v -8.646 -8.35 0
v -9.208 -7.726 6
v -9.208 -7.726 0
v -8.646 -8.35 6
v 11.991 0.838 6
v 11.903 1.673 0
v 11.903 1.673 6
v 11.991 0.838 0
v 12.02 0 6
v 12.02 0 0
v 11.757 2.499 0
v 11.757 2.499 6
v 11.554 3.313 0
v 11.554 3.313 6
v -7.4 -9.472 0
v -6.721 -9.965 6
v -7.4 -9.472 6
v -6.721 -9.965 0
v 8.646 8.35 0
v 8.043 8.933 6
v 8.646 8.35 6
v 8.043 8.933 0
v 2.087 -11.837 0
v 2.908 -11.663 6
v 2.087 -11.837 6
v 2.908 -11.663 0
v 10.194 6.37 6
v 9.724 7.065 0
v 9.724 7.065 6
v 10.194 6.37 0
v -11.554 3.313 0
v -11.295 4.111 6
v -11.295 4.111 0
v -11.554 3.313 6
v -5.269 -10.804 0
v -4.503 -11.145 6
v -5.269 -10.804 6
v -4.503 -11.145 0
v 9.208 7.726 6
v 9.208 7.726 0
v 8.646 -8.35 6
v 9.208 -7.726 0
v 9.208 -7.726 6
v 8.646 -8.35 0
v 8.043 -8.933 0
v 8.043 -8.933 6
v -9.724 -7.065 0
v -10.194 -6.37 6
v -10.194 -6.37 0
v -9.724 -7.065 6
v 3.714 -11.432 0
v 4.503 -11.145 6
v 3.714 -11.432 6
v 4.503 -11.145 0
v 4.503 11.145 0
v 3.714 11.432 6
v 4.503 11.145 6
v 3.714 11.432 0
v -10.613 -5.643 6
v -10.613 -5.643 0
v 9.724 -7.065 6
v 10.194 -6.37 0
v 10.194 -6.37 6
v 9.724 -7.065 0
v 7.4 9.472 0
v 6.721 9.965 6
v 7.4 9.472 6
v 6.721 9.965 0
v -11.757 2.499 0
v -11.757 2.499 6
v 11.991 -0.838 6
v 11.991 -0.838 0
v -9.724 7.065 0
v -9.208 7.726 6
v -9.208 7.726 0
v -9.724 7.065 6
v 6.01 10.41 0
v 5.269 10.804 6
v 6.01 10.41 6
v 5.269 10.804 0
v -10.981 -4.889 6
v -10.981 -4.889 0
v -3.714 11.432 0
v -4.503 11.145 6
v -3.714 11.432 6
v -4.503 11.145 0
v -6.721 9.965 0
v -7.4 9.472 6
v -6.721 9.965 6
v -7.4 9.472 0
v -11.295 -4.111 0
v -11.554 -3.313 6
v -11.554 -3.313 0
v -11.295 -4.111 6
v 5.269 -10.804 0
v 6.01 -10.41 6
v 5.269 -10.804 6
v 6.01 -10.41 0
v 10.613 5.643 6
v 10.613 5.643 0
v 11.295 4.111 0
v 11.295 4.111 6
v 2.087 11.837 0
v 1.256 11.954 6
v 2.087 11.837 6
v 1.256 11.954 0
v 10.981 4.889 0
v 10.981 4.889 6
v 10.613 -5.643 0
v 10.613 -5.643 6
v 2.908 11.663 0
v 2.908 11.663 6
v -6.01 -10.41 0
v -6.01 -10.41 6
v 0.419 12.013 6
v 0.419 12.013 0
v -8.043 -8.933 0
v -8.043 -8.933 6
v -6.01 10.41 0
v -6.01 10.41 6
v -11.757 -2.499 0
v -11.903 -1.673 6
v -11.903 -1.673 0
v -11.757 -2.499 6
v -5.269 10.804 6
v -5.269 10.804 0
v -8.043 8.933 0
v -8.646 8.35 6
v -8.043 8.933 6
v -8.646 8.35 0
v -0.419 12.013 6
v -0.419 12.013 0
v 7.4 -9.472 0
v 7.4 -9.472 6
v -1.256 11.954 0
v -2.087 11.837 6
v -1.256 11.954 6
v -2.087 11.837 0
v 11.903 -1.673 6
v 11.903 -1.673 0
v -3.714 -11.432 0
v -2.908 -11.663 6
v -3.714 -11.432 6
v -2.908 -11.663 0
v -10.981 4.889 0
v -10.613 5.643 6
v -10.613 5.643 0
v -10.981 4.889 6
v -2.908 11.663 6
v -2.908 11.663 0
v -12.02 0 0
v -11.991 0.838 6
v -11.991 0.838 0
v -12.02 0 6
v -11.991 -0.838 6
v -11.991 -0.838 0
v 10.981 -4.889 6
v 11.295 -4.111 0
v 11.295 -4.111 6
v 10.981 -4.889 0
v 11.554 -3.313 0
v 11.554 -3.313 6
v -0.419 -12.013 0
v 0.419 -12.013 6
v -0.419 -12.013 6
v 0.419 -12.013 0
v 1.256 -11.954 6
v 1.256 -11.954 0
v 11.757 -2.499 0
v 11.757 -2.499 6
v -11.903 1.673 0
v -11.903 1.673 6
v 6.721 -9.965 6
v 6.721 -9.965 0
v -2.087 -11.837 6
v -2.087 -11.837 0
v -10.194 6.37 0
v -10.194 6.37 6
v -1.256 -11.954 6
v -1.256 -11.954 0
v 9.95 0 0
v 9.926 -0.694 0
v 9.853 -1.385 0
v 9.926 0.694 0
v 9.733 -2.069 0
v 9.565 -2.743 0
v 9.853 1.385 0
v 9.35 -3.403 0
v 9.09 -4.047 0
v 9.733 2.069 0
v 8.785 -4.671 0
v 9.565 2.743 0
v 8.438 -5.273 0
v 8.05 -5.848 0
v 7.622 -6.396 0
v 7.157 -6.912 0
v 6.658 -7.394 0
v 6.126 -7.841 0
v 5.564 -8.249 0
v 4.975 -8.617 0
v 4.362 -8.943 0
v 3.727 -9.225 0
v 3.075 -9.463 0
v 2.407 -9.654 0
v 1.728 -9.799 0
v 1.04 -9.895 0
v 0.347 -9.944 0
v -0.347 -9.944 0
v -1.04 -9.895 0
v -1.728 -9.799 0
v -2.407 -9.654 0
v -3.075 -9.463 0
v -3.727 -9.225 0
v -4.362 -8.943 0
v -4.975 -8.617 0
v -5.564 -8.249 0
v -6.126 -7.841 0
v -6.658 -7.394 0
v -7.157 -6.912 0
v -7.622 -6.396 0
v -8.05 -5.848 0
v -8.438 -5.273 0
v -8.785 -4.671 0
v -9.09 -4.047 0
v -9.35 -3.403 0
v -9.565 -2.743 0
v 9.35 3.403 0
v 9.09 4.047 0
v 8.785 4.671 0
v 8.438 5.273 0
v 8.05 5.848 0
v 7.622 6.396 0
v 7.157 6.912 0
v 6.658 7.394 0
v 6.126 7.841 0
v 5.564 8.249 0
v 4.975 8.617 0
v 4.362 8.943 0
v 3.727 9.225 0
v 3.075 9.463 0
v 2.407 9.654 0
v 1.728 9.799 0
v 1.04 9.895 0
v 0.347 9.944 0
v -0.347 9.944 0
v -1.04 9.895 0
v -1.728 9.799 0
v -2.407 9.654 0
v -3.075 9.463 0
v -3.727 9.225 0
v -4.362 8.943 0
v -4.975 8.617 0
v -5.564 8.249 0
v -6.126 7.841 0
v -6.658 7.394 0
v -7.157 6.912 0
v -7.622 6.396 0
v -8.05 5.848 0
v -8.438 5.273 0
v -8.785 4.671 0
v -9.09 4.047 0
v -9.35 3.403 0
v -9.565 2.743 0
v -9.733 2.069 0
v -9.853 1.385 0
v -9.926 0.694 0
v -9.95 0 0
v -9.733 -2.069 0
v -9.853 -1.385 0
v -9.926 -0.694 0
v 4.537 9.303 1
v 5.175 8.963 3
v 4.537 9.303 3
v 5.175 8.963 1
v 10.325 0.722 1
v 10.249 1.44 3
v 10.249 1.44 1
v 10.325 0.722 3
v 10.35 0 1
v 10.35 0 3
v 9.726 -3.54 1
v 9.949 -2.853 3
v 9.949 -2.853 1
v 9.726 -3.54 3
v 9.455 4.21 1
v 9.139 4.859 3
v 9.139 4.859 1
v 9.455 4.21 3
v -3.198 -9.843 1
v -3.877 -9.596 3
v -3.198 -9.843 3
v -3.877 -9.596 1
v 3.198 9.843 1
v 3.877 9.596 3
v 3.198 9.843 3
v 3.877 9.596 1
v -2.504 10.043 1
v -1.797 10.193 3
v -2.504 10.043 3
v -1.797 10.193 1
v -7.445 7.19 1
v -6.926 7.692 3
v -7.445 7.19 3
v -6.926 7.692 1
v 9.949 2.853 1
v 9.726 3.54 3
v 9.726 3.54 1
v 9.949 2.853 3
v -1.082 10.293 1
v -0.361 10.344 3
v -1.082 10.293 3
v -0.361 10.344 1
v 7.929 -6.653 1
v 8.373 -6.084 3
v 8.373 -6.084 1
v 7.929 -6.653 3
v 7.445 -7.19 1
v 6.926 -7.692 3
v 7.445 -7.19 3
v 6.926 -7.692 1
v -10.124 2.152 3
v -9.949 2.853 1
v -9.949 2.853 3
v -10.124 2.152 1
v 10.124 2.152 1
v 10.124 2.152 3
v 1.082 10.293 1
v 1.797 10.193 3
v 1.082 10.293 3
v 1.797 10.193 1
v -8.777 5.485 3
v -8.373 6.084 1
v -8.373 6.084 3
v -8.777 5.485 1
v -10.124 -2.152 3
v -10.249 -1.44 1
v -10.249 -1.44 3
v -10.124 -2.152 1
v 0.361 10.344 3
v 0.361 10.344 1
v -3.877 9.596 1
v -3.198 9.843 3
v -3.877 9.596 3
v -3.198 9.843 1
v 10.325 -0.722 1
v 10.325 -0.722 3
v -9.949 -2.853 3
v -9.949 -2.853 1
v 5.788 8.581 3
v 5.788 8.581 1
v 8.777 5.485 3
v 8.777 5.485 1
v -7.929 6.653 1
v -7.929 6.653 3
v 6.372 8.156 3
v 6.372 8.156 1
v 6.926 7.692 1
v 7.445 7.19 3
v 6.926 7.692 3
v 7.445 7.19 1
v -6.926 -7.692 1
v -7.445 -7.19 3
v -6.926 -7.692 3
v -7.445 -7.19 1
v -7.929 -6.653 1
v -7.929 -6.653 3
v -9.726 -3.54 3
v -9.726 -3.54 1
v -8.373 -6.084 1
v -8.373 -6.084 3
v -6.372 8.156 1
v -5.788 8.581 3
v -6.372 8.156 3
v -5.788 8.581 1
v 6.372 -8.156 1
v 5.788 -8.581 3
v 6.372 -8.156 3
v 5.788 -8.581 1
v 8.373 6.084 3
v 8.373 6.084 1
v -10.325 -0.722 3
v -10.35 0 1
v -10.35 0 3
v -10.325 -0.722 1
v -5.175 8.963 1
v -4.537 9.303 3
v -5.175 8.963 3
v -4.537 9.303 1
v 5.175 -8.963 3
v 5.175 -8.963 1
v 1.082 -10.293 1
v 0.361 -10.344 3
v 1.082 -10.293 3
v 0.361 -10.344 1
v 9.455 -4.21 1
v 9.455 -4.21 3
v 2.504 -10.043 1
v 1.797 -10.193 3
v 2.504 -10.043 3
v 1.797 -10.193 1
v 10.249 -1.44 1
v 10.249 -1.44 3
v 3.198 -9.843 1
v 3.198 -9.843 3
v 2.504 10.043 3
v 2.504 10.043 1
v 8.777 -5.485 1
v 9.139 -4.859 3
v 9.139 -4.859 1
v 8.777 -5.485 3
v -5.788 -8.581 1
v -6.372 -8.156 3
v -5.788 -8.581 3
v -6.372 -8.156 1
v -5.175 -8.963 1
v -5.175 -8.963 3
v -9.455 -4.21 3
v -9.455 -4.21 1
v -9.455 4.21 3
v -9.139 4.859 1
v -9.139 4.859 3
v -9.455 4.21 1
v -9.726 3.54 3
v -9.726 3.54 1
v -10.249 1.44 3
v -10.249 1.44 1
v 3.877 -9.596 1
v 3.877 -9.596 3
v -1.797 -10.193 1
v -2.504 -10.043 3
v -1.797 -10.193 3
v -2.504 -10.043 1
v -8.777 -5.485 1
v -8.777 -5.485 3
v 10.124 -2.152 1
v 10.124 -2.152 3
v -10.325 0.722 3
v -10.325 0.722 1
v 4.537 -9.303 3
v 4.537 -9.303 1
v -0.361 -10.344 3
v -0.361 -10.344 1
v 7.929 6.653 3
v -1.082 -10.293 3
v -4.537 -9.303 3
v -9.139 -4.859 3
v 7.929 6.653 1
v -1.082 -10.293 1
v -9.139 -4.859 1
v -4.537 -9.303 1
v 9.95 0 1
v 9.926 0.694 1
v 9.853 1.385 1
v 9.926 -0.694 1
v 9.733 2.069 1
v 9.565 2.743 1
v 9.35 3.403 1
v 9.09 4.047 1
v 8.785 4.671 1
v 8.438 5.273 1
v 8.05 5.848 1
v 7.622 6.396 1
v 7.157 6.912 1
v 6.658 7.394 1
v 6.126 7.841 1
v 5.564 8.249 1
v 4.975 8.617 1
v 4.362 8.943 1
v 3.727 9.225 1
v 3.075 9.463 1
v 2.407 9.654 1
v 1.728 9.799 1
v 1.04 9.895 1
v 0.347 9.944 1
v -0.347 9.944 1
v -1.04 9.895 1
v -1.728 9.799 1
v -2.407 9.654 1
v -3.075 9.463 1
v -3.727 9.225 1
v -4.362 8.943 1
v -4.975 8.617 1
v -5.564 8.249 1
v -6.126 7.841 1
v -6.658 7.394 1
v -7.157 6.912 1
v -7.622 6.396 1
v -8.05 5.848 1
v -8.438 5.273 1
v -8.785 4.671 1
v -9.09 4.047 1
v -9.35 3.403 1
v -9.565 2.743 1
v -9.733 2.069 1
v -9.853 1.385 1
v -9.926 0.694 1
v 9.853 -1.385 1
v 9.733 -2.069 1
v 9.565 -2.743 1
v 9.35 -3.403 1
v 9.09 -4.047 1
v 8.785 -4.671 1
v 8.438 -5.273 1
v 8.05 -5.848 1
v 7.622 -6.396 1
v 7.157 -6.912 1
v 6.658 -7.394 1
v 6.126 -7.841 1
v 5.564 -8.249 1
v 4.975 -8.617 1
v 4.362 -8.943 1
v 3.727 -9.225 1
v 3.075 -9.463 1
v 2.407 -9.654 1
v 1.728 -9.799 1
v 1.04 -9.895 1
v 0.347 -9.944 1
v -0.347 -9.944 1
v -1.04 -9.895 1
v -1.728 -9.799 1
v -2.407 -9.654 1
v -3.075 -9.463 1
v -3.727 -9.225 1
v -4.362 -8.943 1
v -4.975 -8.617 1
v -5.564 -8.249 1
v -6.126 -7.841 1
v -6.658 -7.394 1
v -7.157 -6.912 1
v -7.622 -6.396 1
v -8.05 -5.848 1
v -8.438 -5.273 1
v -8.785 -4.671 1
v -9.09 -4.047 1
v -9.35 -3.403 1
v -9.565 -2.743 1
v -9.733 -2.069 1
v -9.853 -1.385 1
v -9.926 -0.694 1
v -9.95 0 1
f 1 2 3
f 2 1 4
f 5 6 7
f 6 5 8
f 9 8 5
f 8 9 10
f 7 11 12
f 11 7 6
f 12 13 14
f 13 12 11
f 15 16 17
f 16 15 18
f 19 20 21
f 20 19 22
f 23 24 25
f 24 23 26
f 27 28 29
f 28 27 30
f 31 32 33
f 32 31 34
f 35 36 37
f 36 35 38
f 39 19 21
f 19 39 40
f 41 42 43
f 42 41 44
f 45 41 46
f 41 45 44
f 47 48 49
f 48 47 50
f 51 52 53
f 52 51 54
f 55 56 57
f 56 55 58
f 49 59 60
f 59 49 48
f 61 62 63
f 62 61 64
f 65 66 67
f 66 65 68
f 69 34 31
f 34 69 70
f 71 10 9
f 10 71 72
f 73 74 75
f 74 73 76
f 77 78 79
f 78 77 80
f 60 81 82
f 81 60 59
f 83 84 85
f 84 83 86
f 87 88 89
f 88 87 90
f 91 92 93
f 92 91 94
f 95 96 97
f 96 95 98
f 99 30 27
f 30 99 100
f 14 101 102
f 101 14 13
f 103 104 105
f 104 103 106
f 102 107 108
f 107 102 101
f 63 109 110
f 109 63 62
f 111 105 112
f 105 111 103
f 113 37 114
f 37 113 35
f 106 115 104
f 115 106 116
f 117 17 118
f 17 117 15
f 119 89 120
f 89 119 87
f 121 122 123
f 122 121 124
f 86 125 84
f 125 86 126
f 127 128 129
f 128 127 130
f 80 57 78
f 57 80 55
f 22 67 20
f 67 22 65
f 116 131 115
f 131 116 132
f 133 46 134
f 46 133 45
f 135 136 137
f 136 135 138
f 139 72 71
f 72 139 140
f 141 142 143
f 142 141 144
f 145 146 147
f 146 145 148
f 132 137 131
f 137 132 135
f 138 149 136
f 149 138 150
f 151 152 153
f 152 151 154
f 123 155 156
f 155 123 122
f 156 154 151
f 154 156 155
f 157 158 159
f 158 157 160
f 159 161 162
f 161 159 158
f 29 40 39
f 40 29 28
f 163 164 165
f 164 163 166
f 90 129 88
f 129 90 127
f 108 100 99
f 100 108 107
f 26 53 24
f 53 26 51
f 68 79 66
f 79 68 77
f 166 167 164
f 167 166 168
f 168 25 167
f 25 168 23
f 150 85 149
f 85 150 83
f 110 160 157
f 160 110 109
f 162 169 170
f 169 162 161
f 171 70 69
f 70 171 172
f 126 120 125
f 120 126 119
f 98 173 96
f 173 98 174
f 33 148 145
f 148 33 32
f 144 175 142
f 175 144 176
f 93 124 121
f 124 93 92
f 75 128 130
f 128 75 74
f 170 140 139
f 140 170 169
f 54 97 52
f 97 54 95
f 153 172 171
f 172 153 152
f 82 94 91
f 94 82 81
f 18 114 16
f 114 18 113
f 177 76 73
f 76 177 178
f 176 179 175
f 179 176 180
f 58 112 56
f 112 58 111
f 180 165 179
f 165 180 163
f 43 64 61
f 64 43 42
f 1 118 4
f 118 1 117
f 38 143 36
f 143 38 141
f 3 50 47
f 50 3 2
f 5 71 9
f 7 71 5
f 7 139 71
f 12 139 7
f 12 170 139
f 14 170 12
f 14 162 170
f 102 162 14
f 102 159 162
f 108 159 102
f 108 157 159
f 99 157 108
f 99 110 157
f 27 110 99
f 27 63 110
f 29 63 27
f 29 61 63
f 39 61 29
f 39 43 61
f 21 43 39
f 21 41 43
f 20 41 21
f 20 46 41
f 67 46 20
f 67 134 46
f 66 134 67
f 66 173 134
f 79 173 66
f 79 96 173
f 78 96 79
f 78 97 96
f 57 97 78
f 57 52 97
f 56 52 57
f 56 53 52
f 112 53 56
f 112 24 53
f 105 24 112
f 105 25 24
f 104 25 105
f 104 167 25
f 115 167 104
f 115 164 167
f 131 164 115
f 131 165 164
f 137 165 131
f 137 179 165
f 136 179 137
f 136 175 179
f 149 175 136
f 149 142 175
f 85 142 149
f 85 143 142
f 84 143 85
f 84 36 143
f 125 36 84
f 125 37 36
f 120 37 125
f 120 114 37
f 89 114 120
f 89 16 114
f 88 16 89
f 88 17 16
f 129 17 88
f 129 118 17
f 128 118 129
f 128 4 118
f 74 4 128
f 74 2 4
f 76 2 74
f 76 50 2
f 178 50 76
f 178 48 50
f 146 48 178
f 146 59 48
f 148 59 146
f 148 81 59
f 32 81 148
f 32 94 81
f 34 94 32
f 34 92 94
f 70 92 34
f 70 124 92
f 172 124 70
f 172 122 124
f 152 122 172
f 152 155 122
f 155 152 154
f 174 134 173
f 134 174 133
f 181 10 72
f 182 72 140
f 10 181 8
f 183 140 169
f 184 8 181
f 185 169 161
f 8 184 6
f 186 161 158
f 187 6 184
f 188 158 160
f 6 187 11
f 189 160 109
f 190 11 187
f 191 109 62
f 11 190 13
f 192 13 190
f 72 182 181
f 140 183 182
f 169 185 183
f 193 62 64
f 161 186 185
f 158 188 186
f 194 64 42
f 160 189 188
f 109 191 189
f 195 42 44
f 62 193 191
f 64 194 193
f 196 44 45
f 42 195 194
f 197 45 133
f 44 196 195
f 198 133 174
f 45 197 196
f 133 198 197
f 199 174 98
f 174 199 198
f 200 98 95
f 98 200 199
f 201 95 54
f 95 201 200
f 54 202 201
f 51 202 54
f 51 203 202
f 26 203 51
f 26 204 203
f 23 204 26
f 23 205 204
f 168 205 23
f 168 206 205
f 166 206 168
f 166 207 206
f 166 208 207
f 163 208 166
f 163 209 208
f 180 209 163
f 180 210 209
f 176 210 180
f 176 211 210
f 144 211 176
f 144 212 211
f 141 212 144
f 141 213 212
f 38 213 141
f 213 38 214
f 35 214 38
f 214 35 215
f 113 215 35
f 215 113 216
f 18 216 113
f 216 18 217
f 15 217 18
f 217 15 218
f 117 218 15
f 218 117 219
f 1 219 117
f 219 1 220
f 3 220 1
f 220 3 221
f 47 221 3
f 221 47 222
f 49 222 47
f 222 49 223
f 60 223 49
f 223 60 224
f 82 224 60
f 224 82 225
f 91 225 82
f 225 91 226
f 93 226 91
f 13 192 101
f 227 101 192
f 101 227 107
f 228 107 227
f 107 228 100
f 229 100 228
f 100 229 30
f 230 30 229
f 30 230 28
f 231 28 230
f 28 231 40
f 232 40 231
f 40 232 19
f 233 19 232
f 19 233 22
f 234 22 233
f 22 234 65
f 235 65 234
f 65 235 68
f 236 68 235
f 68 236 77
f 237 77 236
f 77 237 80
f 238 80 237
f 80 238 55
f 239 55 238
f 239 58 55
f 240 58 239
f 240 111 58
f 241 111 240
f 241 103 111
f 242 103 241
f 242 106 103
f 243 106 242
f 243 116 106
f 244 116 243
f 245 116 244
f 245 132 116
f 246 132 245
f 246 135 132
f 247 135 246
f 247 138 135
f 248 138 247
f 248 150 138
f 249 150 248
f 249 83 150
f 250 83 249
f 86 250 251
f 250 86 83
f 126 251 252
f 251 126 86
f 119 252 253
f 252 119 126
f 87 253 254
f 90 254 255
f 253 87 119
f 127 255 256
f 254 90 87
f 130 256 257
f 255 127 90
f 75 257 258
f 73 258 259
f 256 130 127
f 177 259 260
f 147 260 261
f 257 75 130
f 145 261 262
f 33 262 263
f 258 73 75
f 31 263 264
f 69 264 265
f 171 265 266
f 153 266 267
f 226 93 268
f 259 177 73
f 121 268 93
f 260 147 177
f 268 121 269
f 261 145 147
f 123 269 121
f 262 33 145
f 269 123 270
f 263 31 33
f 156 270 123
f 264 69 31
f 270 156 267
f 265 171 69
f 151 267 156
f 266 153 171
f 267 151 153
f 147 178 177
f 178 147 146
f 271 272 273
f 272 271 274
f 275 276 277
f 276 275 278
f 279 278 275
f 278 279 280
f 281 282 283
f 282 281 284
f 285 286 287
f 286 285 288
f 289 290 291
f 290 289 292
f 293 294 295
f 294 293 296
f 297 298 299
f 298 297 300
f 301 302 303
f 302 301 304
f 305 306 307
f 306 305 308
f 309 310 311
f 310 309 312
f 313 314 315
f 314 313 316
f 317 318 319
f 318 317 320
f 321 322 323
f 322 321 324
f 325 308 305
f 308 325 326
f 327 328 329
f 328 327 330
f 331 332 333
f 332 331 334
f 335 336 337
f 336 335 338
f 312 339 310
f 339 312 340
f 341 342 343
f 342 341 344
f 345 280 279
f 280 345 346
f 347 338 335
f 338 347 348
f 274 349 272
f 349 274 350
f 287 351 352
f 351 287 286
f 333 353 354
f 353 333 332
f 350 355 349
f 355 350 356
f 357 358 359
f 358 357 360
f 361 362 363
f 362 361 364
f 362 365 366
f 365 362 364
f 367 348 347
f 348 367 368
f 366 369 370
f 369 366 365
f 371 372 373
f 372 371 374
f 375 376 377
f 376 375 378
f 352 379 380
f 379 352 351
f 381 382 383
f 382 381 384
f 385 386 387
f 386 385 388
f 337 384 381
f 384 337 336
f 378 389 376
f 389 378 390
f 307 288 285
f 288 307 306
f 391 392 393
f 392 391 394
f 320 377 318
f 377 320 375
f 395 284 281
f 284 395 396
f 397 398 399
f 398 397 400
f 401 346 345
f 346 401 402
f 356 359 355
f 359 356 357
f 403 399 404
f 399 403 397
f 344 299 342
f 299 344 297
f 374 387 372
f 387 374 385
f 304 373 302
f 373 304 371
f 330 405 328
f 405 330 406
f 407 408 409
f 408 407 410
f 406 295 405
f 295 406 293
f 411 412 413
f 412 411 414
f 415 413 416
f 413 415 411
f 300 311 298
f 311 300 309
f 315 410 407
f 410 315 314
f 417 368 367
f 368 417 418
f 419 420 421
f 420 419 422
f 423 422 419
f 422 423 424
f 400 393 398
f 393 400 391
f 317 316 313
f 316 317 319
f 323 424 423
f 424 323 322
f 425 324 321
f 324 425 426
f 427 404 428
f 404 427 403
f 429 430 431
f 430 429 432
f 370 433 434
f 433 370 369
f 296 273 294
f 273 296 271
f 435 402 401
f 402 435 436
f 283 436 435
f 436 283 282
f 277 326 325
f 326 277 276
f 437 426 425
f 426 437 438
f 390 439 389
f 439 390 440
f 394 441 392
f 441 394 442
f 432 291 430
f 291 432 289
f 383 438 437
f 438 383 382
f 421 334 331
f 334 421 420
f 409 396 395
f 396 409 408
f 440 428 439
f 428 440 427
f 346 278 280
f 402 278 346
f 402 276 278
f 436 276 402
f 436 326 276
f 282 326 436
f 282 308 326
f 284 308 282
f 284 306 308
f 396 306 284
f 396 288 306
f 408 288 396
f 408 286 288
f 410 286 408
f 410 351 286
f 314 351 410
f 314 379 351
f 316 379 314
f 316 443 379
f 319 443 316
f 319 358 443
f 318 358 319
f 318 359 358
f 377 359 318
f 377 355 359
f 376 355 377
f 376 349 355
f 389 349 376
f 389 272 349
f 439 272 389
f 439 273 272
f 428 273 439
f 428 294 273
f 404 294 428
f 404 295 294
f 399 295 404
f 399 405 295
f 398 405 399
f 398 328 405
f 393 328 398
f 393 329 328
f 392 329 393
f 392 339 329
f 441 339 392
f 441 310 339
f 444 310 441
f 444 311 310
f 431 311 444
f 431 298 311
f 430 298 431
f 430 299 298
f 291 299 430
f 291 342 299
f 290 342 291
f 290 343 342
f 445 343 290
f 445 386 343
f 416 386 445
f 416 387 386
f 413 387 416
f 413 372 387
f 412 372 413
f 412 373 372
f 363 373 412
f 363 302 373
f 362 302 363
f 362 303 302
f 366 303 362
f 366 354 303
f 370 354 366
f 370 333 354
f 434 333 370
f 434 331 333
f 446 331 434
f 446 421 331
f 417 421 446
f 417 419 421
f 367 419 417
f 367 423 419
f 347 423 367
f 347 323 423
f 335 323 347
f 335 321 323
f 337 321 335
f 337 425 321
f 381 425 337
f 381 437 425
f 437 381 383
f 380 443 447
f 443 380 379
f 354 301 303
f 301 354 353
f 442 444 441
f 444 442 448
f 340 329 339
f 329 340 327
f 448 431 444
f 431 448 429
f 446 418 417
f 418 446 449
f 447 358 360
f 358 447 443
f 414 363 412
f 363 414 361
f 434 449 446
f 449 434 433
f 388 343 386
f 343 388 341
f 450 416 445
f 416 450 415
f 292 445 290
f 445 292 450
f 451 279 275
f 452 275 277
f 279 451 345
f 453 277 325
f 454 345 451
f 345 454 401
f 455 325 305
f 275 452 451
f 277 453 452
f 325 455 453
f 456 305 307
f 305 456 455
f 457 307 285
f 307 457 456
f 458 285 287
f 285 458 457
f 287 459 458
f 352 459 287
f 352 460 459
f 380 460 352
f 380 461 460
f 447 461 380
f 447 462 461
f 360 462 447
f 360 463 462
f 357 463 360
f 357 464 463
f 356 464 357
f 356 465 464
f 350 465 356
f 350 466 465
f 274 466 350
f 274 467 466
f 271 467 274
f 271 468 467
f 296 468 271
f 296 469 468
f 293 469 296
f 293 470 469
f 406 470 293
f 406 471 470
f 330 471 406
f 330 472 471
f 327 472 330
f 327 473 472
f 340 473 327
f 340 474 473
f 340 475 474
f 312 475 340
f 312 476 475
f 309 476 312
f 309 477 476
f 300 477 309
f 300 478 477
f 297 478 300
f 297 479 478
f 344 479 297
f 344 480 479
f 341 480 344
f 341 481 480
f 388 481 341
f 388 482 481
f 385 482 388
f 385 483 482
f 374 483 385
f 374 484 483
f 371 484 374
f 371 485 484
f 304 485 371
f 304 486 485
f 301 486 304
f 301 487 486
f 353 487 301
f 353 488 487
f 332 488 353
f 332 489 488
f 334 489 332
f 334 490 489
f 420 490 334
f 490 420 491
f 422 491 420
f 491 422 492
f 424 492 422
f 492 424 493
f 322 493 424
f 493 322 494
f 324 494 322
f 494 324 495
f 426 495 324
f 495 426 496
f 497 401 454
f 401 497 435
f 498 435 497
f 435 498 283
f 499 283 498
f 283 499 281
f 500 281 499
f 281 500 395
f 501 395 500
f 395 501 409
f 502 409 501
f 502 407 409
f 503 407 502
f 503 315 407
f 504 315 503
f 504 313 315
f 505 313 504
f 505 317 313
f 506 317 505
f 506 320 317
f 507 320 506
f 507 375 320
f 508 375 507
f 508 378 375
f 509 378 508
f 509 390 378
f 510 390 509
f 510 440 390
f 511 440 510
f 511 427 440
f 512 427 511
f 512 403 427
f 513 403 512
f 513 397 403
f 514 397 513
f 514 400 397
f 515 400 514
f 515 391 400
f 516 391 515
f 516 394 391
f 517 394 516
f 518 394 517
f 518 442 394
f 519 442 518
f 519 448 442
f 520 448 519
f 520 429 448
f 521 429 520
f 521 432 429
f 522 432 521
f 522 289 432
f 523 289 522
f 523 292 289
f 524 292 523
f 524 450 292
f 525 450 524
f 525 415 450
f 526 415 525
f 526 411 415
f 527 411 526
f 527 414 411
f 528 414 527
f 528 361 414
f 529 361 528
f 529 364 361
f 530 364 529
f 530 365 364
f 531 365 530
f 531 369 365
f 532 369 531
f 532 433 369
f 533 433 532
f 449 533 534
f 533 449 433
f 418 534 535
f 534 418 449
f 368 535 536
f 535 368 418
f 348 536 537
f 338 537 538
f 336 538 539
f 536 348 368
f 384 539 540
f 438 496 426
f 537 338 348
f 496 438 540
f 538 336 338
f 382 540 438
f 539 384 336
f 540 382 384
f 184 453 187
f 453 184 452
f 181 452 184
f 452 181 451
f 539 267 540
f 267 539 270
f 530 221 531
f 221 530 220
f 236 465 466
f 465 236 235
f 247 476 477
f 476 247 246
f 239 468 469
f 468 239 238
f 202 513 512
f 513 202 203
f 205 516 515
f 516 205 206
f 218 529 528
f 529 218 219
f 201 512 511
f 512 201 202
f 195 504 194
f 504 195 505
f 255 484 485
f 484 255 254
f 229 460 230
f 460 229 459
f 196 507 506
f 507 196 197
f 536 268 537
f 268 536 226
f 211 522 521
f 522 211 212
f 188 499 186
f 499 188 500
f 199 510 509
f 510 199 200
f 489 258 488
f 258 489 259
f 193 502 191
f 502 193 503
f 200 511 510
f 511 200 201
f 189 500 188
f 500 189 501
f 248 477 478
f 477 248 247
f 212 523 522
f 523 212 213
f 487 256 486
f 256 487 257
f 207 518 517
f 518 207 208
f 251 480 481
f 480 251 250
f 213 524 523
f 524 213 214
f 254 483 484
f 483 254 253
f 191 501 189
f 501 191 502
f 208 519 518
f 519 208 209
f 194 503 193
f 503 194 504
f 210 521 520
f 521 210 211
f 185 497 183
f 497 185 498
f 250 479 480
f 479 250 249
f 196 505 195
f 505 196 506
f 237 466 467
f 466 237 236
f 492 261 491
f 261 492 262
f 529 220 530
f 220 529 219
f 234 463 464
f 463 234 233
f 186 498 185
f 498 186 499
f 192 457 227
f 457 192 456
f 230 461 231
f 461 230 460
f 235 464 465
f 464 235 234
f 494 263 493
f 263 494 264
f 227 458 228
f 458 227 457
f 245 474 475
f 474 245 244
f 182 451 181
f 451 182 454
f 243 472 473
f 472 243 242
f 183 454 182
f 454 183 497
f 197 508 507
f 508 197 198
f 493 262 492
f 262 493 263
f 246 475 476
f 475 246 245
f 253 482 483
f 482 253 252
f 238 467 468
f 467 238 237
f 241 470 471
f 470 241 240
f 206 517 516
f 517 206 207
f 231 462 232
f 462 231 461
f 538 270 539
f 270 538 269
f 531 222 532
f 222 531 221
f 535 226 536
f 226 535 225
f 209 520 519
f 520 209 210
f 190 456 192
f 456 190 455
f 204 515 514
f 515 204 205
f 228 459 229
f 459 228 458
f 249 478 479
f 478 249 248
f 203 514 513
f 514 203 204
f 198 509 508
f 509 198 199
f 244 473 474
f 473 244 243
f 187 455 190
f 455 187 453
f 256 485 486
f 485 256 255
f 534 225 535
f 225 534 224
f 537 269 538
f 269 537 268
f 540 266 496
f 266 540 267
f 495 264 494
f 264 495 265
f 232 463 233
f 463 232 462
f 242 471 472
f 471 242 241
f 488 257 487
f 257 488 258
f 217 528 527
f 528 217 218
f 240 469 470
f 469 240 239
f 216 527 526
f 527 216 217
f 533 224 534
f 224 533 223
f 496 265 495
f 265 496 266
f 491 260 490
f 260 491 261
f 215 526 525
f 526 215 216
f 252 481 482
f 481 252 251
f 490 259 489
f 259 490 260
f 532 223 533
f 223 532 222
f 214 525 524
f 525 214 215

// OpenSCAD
/*
 * Replacement Clamp Pads Part A
 *
 * Author: Pavel Rampas
 * Version: 1.0.0 (Changelog is at the bottom)
 * License: CC BY-SA 4.0 [https://creativecommons.org/licenses/by-sa/4.0/]
 * Link: https://github.com/pavelrampas/openscad-models
 *
 * OpenSCAD version: 2021.01
 *
 * Instructions:
 * Set up parameters, render and print.
 *
 * Height is layer.
 * Thickness is perimeter.
 */

// Parameters
//------------------------------------------------------------------------------

$fn = $preview ? 15 : 90;

clampCircleDiameter = 20.7; // small 20.7, large 19.2
clampCircleHeight = 1; // small 1, large 2

// Parameters that don't need to be changed
//------------------------------------------------------------------------------

thickness = 1.67; // wall thickness
topHeight = 3;

ringHeight = 1;
ringThickness = 0.8;

// Code
//------------------------------------------------------------------------------

difference() {
    cylinder(
        h = 1 + clampCircleHeight + ringHeight + topHeight,
        d = clampCircleDiameter + (2 * thickness)
    );
    // clamp circle
    cylinder(h = 1 + clampCircleHeight + ringHeight, d = clampCircleDiameter);
}

difference() {
    cylinder(h = ringHeight, d = clampCircleDiameter + (2 * thickness));
    cylinder(h = ringHeight, d = clampCircleDiameter - ringThickness);
}

// Functions
//------------------------------------------------------------------------------

// Modules
//------------------------------------------------------------------------------

// Changelog
//------------------------------------------------------------------------------

// [1.0.0]:
// Initial release.
